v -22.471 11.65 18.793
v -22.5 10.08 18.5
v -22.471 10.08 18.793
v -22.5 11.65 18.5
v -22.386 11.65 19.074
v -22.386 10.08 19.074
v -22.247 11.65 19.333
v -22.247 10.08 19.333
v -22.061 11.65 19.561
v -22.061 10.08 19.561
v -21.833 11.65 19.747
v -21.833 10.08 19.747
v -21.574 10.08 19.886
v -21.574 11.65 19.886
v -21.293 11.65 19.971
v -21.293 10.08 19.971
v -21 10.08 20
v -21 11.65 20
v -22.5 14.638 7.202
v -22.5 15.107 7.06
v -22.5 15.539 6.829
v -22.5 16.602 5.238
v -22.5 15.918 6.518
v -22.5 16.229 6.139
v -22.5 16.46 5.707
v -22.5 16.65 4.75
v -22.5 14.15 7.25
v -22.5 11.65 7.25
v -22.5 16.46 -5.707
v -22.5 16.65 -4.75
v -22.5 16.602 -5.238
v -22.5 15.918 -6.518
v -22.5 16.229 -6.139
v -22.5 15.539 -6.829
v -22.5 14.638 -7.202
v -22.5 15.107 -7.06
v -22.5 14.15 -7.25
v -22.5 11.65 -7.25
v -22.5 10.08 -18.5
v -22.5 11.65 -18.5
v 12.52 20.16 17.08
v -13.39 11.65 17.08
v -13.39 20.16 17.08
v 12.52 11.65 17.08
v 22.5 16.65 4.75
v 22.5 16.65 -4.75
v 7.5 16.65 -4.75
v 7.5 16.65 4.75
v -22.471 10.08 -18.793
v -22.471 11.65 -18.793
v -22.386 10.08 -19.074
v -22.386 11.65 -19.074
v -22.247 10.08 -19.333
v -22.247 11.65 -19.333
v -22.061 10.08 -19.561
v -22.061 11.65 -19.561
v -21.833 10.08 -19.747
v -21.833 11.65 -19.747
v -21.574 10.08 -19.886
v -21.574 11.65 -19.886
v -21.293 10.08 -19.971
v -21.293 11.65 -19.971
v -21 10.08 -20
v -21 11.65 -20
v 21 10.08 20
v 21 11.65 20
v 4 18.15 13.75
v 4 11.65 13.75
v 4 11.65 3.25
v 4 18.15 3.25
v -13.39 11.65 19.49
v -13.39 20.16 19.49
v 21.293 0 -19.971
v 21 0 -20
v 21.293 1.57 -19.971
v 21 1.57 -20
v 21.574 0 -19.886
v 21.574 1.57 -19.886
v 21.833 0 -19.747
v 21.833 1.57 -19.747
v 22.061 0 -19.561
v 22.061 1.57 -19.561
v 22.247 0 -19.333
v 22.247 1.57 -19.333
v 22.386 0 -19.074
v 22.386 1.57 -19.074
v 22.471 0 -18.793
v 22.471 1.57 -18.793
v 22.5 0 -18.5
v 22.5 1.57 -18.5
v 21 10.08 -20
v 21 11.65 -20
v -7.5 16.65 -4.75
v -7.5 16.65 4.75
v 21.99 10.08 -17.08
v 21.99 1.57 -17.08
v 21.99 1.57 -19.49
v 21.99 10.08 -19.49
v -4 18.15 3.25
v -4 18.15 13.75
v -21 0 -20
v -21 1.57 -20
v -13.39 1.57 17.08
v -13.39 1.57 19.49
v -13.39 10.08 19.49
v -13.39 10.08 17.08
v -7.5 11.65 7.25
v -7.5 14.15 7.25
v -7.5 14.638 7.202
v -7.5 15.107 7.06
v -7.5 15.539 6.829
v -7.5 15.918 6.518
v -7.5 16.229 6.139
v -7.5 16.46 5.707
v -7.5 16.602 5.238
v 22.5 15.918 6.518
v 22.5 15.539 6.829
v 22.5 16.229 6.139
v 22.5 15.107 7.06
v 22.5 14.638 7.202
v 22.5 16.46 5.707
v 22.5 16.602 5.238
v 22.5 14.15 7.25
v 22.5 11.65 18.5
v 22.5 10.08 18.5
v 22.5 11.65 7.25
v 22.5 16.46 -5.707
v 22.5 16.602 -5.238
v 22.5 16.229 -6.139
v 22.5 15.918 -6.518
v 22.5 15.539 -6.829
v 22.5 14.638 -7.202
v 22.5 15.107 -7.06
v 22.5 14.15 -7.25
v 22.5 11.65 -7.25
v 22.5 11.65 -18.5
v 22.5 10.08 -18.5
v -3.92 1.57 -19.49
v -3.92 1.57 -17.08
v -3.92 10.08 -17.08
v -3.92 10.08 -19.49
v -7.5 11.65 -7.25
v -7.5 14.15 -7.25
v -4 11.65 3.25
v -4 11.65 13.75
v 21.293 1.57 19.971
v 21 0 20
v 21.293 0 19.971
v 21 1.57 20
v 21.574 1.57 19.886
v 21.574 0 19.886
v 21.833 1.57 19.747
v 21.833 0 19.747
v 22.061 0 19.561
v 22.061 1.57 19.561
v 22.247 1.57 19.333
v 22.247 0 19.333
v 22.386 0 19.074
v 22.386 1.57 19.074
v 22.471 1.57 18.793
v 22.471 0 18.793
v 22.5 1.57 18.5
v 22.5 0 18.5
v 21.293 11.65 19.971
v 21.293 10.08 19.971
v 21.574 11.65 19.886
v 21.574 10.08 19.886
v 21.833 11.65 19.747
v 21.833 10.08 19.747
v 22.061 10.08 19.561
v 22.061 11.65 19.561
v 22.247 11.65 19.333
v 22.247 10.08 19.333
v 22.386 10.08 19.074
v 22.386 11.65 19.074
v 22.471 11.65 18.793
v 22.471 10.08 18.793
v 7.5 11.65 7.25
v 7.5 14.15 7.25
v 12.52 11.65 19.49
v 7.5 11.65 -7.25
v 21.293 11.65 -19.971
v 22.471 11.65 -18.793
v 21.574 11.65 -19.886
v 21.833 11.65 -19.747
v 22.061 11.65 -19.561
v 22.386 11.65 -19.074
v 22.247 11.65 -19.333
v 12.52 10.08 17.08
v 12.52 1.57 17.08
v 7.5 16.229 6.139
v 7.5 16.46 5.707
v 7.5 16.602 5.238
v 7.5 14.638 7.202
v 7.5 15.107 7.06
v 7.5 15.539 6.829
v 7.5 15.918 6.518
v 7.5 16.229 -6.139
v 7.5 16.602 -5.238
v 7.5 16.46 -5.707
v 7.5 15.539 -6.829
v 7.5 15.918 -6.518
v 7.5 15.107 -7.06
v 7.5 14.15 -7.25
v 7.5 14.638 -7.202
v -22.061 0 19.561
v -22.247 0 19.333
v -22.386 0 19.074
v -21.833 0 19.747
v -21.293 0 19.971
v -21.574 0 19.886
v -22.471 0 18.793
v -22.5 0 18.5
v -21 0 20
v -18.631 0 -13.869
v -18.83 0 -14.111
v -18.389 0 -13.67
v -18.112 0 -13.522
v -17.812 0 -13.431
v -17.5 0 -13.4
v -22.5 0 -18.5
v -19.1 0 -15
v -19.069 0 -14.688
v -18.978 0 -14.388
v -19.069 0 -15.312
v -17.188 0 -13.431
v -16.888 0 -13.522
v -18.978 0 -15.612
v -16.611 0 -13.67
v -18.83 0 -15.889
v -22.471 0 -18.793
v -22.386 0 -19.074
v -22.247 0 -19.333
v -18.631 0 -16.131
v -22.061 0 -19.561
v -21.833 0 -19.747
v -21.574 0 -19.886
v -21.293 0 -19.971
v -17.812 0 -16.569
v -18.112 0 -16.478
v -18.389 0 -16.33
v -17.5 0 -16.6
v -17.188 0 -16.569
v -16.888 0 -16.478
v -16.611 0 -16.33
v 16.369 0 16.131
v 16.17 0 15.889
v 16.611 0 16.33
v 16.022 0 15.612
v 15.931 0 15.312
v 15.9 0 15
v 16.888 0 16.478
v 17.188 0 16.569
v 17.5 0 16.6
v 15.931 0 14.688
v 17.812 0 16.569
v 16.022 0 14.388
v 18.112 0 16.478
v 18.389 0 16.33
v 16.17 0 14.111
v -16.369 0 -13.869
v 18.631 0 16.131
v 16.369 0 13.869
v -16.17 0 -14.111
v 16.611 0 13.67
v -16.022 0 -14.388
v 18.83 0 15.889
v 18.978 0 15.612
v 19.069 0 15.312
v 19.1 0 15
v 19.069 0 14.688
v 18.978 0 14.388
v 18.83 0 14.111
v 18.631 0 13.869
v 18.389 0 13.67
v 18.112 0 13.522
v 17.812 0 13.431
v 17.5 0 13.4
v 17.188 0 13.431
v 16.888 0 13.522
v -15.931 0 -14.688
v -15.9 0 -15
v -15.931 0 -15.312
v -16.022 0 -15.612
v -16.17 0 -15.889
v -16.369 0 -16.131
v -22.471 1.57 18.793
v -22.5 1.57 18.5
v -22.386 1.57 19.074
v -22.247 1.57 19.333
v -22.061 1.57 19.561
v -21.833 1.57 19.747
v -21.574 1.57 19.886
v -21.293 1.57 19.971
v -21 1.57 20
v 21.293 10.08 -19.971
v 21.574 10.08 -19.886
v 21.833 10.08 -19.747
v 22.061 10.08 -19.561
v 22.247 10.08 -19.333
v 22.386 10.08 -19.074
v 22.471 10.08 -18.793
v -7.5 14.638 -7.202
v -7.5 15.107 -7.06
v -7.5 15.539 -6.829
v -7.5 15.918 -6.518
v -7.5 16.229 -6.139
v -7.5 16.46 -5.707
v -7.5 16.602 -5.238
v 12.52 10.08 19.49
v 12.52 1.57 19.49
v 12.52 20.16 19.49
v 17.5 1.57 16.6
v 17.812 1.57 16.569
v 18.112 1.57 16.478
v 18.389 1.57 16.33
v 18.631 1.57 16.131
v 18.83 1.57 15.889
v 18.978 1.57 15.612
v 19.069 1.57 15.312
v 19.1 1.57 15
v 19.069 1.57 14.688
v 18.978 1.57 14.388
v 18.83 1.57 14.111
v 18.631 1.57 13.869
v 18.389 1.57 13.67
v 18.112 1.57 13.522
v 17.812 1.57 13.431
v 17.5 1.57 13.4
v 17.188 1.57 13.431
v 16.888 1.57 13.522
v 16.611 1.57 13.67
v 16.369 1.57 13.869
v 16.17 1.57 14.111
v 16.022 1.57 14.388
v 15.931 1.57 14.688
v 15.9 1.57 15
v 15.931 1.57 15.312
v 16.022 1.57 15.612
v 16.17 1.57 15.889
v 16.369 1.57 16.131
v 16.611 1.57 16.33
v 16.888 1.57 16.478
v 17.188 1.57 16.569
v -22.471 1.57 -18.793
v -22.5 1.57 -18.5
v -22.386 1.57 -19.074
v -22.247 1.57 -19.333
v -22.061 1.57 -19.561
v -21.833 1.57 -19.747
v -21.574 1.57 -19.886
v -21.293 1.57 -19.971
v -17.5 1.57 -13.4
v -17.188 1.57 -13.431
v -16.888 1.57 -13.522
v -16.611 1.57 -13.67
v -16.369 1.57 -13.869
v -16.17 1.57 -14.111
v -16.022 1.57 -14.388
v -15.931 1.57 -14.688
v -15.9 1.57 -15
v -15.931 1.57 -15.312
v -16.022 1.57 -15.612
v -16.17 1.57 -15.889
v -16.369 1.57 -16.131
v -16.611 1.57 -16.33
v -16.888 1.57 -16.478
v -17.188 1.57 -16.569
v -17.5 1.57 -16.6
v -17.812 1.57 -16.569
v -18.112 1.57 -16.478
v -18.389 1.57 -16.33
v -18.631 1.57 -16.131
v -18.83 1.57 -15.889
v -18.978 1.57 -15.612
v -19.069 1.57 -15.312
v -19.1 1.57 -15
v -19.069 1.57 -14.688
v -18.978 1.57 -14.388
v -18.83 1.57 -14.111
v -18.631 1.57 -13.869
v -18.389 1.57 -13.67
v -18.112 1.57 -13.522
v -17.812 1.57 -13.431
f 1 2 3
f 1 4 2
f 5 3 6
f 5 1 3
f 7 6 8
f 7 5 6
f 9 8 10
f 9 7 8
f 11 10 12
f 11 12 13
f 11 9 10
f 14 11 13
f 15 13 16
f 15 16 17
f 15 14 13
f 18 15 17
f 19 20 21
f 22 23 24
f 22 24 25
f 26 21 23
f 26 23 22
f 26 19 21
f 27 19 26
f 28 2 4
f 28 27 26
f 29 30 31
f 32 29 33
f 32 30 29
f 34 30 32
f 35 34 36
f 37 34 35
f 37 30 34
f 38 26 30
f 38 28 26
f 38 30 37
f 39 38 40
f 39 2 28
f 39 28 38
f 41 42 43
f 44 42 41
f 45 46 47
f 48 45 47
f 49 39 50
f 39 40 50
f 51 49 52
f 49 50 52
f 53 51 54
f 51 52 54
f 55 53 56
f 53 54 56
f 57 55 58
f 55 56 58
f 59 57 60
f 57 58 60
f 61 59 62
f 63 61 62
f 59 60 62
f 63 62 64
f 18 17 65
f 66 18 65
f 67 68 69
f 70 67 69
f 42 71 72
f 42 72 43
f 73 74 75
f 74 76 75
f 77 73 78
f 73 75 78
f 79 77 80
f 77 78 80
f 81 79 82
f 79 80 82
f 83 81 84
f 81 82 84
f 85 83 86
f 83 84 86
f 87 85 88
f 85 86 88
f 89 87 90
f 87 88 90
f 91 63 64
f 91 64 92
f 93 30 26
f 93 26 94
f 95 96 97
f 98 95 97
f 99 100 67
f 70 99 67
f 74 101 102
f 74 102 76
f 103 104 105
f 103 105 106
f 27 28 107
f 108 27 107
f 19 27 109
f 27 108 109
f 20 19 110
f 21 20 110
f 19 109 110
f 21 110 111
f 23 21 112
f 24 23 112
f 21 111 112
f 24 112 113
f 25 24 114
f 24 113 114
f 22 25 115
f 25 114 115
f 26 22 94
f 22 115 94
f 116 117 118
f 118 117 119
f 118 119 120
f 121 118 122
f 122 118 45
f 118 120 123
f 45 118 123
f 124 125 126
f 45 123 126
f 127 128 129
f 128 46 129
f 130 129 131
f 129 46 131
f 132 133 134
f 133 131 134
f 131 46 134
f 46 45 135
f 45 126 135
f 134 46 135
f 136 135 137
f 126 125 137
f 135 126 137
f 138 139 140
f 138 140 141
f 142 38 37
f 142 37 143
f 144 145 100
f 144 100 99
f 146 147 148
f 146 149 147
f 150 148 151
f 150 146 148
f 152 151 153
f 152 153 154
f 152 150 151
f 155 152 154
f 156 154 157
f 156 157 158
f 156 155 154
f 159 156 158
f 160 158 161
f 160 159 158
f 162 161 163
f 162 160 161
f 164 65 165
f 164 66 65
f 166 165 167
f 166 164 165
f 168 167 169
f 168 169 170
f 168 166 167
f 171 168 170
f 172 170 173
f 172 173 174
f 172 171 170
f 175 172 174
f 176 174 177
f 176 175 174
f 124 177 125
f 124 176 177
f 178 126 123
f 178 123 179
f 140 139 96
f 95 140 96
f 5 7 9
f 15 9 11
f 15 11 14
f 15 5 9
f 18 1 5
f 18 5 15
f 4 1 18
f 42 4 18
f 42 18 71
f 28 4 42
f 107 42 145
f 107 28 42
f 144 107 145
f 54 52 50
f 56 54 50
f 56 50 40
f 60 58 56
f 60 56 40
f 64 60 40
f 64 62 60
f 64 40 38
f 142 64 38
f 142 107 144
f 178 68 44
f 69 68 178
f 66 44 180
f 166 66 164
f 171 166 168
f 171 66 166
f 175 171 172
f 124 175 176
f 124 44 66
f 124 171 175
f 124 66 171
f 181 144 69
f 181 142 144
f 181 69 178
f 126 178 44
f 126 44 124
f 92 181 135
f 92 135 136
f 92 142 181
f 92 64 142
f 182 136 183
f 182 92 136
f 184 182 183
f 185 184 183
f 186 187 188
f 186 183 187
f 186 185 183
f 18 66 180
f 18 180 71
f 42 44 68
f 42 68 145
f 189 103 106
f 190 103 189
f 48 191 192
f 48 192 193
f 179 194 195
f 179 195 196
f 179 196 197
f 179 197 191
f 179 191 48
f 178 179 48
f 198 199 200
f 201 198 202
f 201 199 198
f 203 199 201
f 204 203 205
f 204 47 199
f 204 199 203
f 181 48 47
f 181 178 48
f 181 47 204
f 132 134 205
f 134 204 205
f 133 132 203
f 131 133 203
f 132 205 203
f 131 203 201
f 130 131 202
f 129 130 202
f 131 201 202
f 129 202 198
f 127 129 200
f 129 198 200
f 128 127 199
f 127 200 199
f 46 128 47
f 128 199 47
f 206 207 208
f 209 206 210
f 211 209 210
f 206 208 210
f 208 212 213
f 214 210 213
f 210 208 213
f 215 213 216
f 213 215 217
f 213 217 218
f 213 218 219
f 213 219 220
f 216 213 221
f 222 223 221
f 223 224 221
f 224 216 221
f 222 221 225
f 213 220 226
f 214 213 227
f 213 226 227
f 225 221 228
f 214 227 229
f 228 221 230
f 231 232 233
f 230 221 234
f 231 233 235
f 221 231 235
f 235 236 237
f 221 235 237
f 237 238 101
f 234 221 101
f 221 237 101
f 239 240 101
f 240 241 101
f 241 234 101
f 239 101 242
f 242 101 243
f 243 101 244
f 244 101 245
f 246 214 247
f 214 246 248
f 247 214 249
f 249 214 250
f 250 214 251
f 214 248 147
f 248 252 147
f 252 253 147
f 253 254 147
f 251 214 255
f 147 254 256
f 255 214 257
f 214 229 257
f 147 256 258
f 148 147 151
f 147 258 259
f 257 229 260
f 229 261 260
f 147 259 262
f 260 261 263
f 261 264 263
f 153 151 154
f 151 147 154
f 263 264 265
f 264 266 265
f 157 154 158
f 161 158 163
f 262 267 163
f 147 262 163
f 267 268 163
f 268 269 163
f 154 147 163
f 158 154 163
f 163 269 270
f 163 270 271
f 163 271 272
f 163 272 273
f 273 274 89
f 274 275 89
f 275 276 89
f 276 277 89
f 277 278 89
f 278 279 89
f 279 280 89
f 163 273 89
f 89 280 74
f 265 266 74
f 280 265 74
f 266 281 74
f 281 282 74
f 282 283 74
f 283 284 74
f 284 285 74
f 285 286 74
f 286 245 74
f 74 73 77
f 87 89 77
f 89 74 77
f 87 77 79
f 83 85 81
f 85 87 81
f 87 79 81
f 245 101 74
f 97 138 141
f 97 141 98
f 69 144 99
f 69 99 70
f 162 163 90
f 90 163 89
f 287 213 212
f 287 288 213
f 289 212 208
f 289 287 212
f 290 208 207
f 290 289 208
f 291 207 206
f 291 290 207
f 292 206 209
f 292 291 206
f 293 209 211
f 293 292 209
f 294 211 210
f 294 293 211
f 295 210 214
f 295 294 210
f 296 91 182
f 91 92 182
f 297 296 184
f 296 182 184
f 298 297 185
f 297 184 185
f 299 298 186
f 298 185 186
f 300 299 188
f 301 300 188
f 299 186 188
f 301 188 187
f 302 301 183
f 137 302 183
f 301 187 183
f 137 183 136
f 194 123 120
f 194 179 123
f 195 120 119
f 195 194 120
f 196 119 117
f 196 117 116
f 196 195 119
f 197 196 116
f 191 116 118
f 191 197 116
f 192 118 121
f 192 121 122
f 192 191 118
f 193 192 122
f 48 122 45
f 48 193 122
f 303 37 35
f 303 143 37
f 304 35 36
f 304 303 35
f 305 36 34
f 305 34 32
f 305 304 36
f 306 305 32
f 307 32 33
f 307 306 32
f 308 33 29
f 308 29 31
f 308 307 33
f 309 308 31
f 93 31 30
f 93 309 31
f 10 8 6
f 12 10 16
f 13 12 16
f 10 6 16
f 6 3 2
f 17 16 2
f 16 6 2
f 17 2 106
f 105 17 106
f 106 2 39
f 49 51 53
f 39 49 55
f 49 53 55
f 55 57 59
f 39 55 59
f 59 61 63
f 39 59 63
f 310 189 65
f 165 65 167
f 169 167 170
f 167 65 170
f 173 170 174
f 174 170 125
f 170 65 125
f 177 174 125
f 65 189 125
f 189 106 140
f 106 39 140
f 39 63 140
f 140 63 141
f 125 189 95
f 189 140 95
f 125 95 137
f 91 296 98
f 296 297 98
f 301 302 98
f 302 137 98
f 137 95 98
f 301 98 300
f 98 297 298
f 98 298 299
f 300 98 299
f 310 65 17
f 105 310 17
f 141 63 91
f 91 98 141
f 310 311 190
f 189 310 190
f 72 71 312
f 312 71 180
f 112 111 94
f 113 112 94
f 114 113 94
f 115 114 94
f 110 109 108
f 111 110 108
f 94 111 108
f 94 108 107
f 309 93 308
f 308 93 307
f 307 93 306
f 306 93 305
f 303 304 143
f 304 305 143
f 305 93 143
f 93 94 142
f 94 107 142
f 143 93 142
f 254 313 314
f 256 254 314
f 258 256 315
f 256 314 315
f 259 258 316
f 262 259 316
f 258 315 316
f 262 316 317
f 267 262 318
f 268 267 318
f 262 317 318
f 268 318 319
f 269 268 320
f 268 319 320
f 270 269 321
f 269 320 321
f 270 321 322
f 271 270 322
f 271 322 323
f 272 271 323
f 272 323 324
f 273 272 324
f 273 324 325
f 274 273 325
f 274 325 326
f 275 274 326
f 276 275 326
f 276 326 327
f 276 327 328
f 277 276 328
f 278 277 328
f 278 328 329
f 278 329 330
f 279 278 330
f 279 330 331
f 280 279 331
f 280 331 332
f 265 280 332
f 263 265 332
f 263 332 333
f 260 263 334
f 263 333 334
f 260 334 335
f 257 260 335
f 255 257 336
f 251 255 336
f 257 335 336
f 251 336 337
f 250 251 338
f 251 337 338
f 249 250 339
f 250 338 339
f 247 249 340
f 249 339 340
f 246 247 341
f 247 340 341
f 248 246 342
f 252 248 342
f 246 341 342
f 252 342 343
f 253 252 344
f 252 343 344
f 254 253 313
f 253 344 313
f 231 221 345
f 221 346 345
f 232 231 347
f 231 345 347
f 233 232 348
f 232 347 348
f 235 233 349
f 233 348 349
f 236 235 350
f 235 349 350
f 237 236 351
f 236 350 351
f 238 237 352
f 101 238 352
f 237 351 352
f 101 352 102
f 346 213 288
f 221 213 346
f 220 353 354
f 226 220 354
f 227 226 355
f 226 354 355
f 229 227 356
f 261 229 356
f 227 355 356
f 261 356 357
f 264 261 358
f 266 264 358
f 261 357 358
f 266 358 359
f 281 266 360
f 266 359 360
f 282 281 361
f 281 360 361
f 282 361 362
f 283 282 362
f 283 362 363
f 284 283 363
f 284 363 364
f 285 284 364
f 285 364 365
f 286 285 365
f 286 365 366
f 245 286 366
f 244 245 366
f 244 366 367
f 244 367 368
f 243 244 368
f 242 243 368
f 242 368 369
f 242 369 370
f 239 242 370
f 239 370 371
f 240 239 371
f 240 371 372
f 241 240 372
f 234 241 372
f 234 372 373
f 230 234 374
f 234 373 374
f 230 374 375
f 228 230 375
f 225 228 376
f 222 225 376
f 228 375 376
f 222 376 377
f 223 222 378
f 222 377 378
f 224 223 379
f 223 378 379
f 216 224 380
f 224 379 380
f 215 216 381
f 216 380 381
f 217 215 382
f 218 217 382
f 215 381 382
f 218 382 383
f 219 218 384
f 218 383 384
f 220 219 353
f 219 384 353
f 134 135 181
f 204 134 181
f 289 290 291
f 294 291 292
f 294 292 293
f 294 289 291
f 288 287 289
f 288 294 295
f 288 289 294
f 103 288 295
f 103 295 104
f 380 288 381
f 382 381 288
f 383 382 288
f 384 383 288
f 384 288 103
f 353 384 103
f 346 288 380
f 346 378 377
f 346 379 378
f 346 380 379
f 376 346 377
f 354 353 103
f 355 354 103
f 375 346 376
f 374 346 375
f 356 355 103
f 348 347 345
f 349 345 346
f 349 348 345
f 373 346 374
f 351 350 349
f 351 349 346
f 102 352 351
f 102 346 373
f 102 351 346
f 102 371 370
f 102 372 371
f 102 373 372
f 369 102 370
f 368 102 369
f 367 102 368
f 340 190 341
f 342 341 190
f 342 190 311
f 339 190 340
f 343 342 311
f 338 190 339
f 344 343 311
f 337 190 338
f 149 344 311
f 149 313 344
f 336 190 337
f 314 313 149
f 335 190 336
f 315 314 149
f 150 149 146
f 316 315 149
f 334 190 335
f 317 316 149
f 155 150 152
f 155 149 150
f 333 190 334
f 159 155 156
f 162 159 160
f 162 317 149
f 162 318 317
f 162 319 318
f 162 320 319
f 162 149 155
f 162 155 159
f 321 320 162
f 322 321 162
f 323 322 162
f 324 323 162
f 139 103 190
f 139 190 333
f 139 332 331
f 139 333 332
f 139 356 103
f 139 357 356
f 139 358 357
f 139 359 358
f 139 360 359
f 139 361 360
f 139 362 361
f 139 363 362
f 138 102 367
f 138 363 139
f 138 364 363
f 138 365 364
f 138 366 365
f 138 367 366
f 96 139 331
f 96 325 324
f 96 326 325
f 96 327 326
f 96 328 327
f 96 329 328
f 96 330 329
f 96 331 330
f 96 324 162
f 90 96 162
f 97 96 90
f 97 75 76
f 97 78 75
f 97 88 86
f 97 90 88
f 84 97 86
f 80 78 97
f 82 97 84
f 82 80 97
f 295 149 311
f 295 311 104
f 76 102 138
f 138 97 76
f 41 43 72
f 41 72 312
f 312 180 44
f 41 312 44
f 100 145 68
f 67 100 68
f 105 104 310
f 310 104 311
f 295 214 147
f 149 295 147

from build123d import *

# Parameters (mm, degrees)
SKETCH1_W            = 45
SKETCH1_H            = 40
BOSS_EXTRUDE1_DEPTH  = 1.57
SKETCH2_W            = 25.91
SKETCH2_H            = 2.41
BOSS_EXTRUDE2_DEPTH  = 8.51
SKETCH3_W            = 45
SKETCH3_H            = 40
BOSS_EXTRUDE3_DEPTH  = 1.57
SKETCH4_W            = 25.91
SKETCH4_H            = 2.41
BOSS_EXTRUDE4_DEPTH  = 8.51
SKETCH5_W            = 15
SKETCH5_H            = 14.5
BOSS_EXTRUDE5_DEPTH  = 5
FILLET1_R            = 2.5
FILLET1_OF_MIRROR1_R = 2.5
SKETCH6_W            = 8
SKETCH6_H            = 10.5
BOSS_EXTRUDE6_DEPTH  = 6.5
CUT_EXTRUDE1_REACH   = 37.381
SKETCH7_R            = 1.6
FILLET2_R            = 1.5
FILLET3_R            = 1.5


with BuildPart() as part:
    # Sketch1 → Boss-Extrude1 (new body)
    with BuildSketch(Plane(origin=(0, 0, 0), x_dir=(1, 0, 0), z_dir=(0, 1, 0))):
        Rectangle(SKETCH1_W, SKETCH1_H)
    extrude(amount=BOSS_EXTRUDE1_DEPTH)

    # Sketch2 → Boss-Extrude2 (add)
    with BuildSketch(Plane(origin=(0, 1.57, 0), x_dir=(1, 0, 0), z_dir=(0, 1, 0))):
        with Locations((9.035, 18.285)):
            Rectangle(SKETCH2_W, SKETCH2_H)
        with Locations((-0.435, -18.285)):
            Rectangle(SKETCH2_W, SKETCH2_H)
    extrude(amount=BOSS_EXTRUDE2_DEPTH)

    # Sketch3 → Boss-Extrude3 (add)
    with BuildSketch(Plane(origin=(0, 10.08, 0), x_dir=(1, 0, 0), z_dir=(0, 1, 0))):
        Rectangle(SKETCH3_W, SKETCH3_H)
    extrude(amount=BOSS_EXTRUDE3_DEPTH)

    # Sketch4 → Boss-Extrude4 (add)
    with BuildSketch(Plane(origin=(0, 11.65, 0), x_dir=(1, 0, 0), z_dir=(0, 1, 0))):
        with Locations((-0.435, -18.285)):
            Rectangle(SKETCH4_W, SKETCH4_H)
    extrude(amount=BOSS_EXTRUDE4_DEPTH)

    # Sketch5 → Boss-Extrude5 (add)
    with BuildSketch(Plane(origin=(0, 11.65, 0), x_dir=(1, 0, 0), z_dir=(0, 1, 0))):
        with Locations((-15, 0)):
            Rectangle(SKETCH5_W, SKETCH5_H)
    boss_extrude5 = extrude(amount=BOSS_EXTRUDE5_DEPTH)

    # Fillet1
    fillet1_edges = [part.edges().sort_by_distance(p)[0] for p in [
        (-15, 16.65, 7.25),
        (-15, 16.65, -7.25),
    ]]
    fillet(fillet1_edges, radius=FILLET1_R)

    # Mirror1: Boss-Extrude5 across plane
    add(boss_extrude5.mirror(Plane(origin=(0, 0, 0), x_dir=(0, 0, 1), z_dir=(1, 0, 0))))

    # Fillet1 of Mirror1
    fillet1_of_mirror1_edges = [part.edges().sort_by_distance(p)[0] for p in [
        (15, 16.65, 7.25),
        (15, 16.65, -7.25),
    ]]
    fillet(fillet1_of_mirror1_edges, radius=FILLET1_OF_MIRROR1_R)

    # Sketch6 → Boss-Extrude6 (add)
    with BuildSketch(Plane(origin=(0, 11.65, 0), x_dir=(1, 0, 0), z_dir=(0, 1, 0))):
        with Locations((0, -8.5)):
            Rectangle(SKETCH6_W, SKETCH6_H)
    extrude(amount=BOSS_EXTRUDE6_DEPTH)

    # Sketch7 → Cut-Extrude1 (cut, up to next)
    with BuildSketch(Plane(origin=(0, 1.57, 0), x_dir=(1, 0, 0), z_dir=(0, 1, 0)), mode=Mode.PRIVATE) as cut_extrude1_sk1:
        with Locations(Location((17.5, -15, 0), (0, 0, 270))):
            Circle(SKETCH7_R)
    cut_extrude1_tool1 = extrude(cut_extrude1_sk1.sketch, amount=-CUT_EXTRUDE1_REACH, mode=Mode.PRIVATE) & part.part
    # Sketch7 → Cut-Extrude1 (cut, up to next)
    with BuildSketch(Plane(origin=(0, 1.57, 0), x_dir=(1, 0, 0), z_dir=(0, 1, 0)), mode=Mode.PRIVATE) as cut_extrude1_sk2:
        with Locations(Location((-17.5, 15, 0), (0, 0, 270))):
            Circle(SKETCH7_R)
    cut_extrude1_tool2 = extrude(cut_extrude1_sk2.sketch, amount=-CUT_EXTRUDE1_REACH, mode=Mode.PRIVATE) & part.part
    add(cut_extrude1_tool1.solids().sort_by_distance((17.5, 1.57, 15))[0], mode=Mode.SUBTRACT)
    add(cut_extrude1_tool2.solids().sort_by_distance((-17.5, 1.57, -15))[0], mode=Mode.SUBTRACT)

    # Fillet2
    fillet2_edges = [part.edges().sort_by_distance(p)[0] for p in [
        (22.5, 0.785, 20),
        (-22.5, 0.785, 20),
        (-22.5, 0.785, -20),
        (22.5, 0.785, -20),
    ]]
    fillet(fillet2_edges, radius=FILLET2_R)

    # Fillet3
    fillet3_edges = [part.edges().sort_by_distance(p)[0] for p in [
        (22.5, 10.865, 20),
        (22.5, 10.865, -20),
        (-22.5, 10.865, -20),
        (-22.5, 10.865, 20),
    ]]
    fillet(fillet3_edges, radius=FILLET3_R)


solid = part.part
